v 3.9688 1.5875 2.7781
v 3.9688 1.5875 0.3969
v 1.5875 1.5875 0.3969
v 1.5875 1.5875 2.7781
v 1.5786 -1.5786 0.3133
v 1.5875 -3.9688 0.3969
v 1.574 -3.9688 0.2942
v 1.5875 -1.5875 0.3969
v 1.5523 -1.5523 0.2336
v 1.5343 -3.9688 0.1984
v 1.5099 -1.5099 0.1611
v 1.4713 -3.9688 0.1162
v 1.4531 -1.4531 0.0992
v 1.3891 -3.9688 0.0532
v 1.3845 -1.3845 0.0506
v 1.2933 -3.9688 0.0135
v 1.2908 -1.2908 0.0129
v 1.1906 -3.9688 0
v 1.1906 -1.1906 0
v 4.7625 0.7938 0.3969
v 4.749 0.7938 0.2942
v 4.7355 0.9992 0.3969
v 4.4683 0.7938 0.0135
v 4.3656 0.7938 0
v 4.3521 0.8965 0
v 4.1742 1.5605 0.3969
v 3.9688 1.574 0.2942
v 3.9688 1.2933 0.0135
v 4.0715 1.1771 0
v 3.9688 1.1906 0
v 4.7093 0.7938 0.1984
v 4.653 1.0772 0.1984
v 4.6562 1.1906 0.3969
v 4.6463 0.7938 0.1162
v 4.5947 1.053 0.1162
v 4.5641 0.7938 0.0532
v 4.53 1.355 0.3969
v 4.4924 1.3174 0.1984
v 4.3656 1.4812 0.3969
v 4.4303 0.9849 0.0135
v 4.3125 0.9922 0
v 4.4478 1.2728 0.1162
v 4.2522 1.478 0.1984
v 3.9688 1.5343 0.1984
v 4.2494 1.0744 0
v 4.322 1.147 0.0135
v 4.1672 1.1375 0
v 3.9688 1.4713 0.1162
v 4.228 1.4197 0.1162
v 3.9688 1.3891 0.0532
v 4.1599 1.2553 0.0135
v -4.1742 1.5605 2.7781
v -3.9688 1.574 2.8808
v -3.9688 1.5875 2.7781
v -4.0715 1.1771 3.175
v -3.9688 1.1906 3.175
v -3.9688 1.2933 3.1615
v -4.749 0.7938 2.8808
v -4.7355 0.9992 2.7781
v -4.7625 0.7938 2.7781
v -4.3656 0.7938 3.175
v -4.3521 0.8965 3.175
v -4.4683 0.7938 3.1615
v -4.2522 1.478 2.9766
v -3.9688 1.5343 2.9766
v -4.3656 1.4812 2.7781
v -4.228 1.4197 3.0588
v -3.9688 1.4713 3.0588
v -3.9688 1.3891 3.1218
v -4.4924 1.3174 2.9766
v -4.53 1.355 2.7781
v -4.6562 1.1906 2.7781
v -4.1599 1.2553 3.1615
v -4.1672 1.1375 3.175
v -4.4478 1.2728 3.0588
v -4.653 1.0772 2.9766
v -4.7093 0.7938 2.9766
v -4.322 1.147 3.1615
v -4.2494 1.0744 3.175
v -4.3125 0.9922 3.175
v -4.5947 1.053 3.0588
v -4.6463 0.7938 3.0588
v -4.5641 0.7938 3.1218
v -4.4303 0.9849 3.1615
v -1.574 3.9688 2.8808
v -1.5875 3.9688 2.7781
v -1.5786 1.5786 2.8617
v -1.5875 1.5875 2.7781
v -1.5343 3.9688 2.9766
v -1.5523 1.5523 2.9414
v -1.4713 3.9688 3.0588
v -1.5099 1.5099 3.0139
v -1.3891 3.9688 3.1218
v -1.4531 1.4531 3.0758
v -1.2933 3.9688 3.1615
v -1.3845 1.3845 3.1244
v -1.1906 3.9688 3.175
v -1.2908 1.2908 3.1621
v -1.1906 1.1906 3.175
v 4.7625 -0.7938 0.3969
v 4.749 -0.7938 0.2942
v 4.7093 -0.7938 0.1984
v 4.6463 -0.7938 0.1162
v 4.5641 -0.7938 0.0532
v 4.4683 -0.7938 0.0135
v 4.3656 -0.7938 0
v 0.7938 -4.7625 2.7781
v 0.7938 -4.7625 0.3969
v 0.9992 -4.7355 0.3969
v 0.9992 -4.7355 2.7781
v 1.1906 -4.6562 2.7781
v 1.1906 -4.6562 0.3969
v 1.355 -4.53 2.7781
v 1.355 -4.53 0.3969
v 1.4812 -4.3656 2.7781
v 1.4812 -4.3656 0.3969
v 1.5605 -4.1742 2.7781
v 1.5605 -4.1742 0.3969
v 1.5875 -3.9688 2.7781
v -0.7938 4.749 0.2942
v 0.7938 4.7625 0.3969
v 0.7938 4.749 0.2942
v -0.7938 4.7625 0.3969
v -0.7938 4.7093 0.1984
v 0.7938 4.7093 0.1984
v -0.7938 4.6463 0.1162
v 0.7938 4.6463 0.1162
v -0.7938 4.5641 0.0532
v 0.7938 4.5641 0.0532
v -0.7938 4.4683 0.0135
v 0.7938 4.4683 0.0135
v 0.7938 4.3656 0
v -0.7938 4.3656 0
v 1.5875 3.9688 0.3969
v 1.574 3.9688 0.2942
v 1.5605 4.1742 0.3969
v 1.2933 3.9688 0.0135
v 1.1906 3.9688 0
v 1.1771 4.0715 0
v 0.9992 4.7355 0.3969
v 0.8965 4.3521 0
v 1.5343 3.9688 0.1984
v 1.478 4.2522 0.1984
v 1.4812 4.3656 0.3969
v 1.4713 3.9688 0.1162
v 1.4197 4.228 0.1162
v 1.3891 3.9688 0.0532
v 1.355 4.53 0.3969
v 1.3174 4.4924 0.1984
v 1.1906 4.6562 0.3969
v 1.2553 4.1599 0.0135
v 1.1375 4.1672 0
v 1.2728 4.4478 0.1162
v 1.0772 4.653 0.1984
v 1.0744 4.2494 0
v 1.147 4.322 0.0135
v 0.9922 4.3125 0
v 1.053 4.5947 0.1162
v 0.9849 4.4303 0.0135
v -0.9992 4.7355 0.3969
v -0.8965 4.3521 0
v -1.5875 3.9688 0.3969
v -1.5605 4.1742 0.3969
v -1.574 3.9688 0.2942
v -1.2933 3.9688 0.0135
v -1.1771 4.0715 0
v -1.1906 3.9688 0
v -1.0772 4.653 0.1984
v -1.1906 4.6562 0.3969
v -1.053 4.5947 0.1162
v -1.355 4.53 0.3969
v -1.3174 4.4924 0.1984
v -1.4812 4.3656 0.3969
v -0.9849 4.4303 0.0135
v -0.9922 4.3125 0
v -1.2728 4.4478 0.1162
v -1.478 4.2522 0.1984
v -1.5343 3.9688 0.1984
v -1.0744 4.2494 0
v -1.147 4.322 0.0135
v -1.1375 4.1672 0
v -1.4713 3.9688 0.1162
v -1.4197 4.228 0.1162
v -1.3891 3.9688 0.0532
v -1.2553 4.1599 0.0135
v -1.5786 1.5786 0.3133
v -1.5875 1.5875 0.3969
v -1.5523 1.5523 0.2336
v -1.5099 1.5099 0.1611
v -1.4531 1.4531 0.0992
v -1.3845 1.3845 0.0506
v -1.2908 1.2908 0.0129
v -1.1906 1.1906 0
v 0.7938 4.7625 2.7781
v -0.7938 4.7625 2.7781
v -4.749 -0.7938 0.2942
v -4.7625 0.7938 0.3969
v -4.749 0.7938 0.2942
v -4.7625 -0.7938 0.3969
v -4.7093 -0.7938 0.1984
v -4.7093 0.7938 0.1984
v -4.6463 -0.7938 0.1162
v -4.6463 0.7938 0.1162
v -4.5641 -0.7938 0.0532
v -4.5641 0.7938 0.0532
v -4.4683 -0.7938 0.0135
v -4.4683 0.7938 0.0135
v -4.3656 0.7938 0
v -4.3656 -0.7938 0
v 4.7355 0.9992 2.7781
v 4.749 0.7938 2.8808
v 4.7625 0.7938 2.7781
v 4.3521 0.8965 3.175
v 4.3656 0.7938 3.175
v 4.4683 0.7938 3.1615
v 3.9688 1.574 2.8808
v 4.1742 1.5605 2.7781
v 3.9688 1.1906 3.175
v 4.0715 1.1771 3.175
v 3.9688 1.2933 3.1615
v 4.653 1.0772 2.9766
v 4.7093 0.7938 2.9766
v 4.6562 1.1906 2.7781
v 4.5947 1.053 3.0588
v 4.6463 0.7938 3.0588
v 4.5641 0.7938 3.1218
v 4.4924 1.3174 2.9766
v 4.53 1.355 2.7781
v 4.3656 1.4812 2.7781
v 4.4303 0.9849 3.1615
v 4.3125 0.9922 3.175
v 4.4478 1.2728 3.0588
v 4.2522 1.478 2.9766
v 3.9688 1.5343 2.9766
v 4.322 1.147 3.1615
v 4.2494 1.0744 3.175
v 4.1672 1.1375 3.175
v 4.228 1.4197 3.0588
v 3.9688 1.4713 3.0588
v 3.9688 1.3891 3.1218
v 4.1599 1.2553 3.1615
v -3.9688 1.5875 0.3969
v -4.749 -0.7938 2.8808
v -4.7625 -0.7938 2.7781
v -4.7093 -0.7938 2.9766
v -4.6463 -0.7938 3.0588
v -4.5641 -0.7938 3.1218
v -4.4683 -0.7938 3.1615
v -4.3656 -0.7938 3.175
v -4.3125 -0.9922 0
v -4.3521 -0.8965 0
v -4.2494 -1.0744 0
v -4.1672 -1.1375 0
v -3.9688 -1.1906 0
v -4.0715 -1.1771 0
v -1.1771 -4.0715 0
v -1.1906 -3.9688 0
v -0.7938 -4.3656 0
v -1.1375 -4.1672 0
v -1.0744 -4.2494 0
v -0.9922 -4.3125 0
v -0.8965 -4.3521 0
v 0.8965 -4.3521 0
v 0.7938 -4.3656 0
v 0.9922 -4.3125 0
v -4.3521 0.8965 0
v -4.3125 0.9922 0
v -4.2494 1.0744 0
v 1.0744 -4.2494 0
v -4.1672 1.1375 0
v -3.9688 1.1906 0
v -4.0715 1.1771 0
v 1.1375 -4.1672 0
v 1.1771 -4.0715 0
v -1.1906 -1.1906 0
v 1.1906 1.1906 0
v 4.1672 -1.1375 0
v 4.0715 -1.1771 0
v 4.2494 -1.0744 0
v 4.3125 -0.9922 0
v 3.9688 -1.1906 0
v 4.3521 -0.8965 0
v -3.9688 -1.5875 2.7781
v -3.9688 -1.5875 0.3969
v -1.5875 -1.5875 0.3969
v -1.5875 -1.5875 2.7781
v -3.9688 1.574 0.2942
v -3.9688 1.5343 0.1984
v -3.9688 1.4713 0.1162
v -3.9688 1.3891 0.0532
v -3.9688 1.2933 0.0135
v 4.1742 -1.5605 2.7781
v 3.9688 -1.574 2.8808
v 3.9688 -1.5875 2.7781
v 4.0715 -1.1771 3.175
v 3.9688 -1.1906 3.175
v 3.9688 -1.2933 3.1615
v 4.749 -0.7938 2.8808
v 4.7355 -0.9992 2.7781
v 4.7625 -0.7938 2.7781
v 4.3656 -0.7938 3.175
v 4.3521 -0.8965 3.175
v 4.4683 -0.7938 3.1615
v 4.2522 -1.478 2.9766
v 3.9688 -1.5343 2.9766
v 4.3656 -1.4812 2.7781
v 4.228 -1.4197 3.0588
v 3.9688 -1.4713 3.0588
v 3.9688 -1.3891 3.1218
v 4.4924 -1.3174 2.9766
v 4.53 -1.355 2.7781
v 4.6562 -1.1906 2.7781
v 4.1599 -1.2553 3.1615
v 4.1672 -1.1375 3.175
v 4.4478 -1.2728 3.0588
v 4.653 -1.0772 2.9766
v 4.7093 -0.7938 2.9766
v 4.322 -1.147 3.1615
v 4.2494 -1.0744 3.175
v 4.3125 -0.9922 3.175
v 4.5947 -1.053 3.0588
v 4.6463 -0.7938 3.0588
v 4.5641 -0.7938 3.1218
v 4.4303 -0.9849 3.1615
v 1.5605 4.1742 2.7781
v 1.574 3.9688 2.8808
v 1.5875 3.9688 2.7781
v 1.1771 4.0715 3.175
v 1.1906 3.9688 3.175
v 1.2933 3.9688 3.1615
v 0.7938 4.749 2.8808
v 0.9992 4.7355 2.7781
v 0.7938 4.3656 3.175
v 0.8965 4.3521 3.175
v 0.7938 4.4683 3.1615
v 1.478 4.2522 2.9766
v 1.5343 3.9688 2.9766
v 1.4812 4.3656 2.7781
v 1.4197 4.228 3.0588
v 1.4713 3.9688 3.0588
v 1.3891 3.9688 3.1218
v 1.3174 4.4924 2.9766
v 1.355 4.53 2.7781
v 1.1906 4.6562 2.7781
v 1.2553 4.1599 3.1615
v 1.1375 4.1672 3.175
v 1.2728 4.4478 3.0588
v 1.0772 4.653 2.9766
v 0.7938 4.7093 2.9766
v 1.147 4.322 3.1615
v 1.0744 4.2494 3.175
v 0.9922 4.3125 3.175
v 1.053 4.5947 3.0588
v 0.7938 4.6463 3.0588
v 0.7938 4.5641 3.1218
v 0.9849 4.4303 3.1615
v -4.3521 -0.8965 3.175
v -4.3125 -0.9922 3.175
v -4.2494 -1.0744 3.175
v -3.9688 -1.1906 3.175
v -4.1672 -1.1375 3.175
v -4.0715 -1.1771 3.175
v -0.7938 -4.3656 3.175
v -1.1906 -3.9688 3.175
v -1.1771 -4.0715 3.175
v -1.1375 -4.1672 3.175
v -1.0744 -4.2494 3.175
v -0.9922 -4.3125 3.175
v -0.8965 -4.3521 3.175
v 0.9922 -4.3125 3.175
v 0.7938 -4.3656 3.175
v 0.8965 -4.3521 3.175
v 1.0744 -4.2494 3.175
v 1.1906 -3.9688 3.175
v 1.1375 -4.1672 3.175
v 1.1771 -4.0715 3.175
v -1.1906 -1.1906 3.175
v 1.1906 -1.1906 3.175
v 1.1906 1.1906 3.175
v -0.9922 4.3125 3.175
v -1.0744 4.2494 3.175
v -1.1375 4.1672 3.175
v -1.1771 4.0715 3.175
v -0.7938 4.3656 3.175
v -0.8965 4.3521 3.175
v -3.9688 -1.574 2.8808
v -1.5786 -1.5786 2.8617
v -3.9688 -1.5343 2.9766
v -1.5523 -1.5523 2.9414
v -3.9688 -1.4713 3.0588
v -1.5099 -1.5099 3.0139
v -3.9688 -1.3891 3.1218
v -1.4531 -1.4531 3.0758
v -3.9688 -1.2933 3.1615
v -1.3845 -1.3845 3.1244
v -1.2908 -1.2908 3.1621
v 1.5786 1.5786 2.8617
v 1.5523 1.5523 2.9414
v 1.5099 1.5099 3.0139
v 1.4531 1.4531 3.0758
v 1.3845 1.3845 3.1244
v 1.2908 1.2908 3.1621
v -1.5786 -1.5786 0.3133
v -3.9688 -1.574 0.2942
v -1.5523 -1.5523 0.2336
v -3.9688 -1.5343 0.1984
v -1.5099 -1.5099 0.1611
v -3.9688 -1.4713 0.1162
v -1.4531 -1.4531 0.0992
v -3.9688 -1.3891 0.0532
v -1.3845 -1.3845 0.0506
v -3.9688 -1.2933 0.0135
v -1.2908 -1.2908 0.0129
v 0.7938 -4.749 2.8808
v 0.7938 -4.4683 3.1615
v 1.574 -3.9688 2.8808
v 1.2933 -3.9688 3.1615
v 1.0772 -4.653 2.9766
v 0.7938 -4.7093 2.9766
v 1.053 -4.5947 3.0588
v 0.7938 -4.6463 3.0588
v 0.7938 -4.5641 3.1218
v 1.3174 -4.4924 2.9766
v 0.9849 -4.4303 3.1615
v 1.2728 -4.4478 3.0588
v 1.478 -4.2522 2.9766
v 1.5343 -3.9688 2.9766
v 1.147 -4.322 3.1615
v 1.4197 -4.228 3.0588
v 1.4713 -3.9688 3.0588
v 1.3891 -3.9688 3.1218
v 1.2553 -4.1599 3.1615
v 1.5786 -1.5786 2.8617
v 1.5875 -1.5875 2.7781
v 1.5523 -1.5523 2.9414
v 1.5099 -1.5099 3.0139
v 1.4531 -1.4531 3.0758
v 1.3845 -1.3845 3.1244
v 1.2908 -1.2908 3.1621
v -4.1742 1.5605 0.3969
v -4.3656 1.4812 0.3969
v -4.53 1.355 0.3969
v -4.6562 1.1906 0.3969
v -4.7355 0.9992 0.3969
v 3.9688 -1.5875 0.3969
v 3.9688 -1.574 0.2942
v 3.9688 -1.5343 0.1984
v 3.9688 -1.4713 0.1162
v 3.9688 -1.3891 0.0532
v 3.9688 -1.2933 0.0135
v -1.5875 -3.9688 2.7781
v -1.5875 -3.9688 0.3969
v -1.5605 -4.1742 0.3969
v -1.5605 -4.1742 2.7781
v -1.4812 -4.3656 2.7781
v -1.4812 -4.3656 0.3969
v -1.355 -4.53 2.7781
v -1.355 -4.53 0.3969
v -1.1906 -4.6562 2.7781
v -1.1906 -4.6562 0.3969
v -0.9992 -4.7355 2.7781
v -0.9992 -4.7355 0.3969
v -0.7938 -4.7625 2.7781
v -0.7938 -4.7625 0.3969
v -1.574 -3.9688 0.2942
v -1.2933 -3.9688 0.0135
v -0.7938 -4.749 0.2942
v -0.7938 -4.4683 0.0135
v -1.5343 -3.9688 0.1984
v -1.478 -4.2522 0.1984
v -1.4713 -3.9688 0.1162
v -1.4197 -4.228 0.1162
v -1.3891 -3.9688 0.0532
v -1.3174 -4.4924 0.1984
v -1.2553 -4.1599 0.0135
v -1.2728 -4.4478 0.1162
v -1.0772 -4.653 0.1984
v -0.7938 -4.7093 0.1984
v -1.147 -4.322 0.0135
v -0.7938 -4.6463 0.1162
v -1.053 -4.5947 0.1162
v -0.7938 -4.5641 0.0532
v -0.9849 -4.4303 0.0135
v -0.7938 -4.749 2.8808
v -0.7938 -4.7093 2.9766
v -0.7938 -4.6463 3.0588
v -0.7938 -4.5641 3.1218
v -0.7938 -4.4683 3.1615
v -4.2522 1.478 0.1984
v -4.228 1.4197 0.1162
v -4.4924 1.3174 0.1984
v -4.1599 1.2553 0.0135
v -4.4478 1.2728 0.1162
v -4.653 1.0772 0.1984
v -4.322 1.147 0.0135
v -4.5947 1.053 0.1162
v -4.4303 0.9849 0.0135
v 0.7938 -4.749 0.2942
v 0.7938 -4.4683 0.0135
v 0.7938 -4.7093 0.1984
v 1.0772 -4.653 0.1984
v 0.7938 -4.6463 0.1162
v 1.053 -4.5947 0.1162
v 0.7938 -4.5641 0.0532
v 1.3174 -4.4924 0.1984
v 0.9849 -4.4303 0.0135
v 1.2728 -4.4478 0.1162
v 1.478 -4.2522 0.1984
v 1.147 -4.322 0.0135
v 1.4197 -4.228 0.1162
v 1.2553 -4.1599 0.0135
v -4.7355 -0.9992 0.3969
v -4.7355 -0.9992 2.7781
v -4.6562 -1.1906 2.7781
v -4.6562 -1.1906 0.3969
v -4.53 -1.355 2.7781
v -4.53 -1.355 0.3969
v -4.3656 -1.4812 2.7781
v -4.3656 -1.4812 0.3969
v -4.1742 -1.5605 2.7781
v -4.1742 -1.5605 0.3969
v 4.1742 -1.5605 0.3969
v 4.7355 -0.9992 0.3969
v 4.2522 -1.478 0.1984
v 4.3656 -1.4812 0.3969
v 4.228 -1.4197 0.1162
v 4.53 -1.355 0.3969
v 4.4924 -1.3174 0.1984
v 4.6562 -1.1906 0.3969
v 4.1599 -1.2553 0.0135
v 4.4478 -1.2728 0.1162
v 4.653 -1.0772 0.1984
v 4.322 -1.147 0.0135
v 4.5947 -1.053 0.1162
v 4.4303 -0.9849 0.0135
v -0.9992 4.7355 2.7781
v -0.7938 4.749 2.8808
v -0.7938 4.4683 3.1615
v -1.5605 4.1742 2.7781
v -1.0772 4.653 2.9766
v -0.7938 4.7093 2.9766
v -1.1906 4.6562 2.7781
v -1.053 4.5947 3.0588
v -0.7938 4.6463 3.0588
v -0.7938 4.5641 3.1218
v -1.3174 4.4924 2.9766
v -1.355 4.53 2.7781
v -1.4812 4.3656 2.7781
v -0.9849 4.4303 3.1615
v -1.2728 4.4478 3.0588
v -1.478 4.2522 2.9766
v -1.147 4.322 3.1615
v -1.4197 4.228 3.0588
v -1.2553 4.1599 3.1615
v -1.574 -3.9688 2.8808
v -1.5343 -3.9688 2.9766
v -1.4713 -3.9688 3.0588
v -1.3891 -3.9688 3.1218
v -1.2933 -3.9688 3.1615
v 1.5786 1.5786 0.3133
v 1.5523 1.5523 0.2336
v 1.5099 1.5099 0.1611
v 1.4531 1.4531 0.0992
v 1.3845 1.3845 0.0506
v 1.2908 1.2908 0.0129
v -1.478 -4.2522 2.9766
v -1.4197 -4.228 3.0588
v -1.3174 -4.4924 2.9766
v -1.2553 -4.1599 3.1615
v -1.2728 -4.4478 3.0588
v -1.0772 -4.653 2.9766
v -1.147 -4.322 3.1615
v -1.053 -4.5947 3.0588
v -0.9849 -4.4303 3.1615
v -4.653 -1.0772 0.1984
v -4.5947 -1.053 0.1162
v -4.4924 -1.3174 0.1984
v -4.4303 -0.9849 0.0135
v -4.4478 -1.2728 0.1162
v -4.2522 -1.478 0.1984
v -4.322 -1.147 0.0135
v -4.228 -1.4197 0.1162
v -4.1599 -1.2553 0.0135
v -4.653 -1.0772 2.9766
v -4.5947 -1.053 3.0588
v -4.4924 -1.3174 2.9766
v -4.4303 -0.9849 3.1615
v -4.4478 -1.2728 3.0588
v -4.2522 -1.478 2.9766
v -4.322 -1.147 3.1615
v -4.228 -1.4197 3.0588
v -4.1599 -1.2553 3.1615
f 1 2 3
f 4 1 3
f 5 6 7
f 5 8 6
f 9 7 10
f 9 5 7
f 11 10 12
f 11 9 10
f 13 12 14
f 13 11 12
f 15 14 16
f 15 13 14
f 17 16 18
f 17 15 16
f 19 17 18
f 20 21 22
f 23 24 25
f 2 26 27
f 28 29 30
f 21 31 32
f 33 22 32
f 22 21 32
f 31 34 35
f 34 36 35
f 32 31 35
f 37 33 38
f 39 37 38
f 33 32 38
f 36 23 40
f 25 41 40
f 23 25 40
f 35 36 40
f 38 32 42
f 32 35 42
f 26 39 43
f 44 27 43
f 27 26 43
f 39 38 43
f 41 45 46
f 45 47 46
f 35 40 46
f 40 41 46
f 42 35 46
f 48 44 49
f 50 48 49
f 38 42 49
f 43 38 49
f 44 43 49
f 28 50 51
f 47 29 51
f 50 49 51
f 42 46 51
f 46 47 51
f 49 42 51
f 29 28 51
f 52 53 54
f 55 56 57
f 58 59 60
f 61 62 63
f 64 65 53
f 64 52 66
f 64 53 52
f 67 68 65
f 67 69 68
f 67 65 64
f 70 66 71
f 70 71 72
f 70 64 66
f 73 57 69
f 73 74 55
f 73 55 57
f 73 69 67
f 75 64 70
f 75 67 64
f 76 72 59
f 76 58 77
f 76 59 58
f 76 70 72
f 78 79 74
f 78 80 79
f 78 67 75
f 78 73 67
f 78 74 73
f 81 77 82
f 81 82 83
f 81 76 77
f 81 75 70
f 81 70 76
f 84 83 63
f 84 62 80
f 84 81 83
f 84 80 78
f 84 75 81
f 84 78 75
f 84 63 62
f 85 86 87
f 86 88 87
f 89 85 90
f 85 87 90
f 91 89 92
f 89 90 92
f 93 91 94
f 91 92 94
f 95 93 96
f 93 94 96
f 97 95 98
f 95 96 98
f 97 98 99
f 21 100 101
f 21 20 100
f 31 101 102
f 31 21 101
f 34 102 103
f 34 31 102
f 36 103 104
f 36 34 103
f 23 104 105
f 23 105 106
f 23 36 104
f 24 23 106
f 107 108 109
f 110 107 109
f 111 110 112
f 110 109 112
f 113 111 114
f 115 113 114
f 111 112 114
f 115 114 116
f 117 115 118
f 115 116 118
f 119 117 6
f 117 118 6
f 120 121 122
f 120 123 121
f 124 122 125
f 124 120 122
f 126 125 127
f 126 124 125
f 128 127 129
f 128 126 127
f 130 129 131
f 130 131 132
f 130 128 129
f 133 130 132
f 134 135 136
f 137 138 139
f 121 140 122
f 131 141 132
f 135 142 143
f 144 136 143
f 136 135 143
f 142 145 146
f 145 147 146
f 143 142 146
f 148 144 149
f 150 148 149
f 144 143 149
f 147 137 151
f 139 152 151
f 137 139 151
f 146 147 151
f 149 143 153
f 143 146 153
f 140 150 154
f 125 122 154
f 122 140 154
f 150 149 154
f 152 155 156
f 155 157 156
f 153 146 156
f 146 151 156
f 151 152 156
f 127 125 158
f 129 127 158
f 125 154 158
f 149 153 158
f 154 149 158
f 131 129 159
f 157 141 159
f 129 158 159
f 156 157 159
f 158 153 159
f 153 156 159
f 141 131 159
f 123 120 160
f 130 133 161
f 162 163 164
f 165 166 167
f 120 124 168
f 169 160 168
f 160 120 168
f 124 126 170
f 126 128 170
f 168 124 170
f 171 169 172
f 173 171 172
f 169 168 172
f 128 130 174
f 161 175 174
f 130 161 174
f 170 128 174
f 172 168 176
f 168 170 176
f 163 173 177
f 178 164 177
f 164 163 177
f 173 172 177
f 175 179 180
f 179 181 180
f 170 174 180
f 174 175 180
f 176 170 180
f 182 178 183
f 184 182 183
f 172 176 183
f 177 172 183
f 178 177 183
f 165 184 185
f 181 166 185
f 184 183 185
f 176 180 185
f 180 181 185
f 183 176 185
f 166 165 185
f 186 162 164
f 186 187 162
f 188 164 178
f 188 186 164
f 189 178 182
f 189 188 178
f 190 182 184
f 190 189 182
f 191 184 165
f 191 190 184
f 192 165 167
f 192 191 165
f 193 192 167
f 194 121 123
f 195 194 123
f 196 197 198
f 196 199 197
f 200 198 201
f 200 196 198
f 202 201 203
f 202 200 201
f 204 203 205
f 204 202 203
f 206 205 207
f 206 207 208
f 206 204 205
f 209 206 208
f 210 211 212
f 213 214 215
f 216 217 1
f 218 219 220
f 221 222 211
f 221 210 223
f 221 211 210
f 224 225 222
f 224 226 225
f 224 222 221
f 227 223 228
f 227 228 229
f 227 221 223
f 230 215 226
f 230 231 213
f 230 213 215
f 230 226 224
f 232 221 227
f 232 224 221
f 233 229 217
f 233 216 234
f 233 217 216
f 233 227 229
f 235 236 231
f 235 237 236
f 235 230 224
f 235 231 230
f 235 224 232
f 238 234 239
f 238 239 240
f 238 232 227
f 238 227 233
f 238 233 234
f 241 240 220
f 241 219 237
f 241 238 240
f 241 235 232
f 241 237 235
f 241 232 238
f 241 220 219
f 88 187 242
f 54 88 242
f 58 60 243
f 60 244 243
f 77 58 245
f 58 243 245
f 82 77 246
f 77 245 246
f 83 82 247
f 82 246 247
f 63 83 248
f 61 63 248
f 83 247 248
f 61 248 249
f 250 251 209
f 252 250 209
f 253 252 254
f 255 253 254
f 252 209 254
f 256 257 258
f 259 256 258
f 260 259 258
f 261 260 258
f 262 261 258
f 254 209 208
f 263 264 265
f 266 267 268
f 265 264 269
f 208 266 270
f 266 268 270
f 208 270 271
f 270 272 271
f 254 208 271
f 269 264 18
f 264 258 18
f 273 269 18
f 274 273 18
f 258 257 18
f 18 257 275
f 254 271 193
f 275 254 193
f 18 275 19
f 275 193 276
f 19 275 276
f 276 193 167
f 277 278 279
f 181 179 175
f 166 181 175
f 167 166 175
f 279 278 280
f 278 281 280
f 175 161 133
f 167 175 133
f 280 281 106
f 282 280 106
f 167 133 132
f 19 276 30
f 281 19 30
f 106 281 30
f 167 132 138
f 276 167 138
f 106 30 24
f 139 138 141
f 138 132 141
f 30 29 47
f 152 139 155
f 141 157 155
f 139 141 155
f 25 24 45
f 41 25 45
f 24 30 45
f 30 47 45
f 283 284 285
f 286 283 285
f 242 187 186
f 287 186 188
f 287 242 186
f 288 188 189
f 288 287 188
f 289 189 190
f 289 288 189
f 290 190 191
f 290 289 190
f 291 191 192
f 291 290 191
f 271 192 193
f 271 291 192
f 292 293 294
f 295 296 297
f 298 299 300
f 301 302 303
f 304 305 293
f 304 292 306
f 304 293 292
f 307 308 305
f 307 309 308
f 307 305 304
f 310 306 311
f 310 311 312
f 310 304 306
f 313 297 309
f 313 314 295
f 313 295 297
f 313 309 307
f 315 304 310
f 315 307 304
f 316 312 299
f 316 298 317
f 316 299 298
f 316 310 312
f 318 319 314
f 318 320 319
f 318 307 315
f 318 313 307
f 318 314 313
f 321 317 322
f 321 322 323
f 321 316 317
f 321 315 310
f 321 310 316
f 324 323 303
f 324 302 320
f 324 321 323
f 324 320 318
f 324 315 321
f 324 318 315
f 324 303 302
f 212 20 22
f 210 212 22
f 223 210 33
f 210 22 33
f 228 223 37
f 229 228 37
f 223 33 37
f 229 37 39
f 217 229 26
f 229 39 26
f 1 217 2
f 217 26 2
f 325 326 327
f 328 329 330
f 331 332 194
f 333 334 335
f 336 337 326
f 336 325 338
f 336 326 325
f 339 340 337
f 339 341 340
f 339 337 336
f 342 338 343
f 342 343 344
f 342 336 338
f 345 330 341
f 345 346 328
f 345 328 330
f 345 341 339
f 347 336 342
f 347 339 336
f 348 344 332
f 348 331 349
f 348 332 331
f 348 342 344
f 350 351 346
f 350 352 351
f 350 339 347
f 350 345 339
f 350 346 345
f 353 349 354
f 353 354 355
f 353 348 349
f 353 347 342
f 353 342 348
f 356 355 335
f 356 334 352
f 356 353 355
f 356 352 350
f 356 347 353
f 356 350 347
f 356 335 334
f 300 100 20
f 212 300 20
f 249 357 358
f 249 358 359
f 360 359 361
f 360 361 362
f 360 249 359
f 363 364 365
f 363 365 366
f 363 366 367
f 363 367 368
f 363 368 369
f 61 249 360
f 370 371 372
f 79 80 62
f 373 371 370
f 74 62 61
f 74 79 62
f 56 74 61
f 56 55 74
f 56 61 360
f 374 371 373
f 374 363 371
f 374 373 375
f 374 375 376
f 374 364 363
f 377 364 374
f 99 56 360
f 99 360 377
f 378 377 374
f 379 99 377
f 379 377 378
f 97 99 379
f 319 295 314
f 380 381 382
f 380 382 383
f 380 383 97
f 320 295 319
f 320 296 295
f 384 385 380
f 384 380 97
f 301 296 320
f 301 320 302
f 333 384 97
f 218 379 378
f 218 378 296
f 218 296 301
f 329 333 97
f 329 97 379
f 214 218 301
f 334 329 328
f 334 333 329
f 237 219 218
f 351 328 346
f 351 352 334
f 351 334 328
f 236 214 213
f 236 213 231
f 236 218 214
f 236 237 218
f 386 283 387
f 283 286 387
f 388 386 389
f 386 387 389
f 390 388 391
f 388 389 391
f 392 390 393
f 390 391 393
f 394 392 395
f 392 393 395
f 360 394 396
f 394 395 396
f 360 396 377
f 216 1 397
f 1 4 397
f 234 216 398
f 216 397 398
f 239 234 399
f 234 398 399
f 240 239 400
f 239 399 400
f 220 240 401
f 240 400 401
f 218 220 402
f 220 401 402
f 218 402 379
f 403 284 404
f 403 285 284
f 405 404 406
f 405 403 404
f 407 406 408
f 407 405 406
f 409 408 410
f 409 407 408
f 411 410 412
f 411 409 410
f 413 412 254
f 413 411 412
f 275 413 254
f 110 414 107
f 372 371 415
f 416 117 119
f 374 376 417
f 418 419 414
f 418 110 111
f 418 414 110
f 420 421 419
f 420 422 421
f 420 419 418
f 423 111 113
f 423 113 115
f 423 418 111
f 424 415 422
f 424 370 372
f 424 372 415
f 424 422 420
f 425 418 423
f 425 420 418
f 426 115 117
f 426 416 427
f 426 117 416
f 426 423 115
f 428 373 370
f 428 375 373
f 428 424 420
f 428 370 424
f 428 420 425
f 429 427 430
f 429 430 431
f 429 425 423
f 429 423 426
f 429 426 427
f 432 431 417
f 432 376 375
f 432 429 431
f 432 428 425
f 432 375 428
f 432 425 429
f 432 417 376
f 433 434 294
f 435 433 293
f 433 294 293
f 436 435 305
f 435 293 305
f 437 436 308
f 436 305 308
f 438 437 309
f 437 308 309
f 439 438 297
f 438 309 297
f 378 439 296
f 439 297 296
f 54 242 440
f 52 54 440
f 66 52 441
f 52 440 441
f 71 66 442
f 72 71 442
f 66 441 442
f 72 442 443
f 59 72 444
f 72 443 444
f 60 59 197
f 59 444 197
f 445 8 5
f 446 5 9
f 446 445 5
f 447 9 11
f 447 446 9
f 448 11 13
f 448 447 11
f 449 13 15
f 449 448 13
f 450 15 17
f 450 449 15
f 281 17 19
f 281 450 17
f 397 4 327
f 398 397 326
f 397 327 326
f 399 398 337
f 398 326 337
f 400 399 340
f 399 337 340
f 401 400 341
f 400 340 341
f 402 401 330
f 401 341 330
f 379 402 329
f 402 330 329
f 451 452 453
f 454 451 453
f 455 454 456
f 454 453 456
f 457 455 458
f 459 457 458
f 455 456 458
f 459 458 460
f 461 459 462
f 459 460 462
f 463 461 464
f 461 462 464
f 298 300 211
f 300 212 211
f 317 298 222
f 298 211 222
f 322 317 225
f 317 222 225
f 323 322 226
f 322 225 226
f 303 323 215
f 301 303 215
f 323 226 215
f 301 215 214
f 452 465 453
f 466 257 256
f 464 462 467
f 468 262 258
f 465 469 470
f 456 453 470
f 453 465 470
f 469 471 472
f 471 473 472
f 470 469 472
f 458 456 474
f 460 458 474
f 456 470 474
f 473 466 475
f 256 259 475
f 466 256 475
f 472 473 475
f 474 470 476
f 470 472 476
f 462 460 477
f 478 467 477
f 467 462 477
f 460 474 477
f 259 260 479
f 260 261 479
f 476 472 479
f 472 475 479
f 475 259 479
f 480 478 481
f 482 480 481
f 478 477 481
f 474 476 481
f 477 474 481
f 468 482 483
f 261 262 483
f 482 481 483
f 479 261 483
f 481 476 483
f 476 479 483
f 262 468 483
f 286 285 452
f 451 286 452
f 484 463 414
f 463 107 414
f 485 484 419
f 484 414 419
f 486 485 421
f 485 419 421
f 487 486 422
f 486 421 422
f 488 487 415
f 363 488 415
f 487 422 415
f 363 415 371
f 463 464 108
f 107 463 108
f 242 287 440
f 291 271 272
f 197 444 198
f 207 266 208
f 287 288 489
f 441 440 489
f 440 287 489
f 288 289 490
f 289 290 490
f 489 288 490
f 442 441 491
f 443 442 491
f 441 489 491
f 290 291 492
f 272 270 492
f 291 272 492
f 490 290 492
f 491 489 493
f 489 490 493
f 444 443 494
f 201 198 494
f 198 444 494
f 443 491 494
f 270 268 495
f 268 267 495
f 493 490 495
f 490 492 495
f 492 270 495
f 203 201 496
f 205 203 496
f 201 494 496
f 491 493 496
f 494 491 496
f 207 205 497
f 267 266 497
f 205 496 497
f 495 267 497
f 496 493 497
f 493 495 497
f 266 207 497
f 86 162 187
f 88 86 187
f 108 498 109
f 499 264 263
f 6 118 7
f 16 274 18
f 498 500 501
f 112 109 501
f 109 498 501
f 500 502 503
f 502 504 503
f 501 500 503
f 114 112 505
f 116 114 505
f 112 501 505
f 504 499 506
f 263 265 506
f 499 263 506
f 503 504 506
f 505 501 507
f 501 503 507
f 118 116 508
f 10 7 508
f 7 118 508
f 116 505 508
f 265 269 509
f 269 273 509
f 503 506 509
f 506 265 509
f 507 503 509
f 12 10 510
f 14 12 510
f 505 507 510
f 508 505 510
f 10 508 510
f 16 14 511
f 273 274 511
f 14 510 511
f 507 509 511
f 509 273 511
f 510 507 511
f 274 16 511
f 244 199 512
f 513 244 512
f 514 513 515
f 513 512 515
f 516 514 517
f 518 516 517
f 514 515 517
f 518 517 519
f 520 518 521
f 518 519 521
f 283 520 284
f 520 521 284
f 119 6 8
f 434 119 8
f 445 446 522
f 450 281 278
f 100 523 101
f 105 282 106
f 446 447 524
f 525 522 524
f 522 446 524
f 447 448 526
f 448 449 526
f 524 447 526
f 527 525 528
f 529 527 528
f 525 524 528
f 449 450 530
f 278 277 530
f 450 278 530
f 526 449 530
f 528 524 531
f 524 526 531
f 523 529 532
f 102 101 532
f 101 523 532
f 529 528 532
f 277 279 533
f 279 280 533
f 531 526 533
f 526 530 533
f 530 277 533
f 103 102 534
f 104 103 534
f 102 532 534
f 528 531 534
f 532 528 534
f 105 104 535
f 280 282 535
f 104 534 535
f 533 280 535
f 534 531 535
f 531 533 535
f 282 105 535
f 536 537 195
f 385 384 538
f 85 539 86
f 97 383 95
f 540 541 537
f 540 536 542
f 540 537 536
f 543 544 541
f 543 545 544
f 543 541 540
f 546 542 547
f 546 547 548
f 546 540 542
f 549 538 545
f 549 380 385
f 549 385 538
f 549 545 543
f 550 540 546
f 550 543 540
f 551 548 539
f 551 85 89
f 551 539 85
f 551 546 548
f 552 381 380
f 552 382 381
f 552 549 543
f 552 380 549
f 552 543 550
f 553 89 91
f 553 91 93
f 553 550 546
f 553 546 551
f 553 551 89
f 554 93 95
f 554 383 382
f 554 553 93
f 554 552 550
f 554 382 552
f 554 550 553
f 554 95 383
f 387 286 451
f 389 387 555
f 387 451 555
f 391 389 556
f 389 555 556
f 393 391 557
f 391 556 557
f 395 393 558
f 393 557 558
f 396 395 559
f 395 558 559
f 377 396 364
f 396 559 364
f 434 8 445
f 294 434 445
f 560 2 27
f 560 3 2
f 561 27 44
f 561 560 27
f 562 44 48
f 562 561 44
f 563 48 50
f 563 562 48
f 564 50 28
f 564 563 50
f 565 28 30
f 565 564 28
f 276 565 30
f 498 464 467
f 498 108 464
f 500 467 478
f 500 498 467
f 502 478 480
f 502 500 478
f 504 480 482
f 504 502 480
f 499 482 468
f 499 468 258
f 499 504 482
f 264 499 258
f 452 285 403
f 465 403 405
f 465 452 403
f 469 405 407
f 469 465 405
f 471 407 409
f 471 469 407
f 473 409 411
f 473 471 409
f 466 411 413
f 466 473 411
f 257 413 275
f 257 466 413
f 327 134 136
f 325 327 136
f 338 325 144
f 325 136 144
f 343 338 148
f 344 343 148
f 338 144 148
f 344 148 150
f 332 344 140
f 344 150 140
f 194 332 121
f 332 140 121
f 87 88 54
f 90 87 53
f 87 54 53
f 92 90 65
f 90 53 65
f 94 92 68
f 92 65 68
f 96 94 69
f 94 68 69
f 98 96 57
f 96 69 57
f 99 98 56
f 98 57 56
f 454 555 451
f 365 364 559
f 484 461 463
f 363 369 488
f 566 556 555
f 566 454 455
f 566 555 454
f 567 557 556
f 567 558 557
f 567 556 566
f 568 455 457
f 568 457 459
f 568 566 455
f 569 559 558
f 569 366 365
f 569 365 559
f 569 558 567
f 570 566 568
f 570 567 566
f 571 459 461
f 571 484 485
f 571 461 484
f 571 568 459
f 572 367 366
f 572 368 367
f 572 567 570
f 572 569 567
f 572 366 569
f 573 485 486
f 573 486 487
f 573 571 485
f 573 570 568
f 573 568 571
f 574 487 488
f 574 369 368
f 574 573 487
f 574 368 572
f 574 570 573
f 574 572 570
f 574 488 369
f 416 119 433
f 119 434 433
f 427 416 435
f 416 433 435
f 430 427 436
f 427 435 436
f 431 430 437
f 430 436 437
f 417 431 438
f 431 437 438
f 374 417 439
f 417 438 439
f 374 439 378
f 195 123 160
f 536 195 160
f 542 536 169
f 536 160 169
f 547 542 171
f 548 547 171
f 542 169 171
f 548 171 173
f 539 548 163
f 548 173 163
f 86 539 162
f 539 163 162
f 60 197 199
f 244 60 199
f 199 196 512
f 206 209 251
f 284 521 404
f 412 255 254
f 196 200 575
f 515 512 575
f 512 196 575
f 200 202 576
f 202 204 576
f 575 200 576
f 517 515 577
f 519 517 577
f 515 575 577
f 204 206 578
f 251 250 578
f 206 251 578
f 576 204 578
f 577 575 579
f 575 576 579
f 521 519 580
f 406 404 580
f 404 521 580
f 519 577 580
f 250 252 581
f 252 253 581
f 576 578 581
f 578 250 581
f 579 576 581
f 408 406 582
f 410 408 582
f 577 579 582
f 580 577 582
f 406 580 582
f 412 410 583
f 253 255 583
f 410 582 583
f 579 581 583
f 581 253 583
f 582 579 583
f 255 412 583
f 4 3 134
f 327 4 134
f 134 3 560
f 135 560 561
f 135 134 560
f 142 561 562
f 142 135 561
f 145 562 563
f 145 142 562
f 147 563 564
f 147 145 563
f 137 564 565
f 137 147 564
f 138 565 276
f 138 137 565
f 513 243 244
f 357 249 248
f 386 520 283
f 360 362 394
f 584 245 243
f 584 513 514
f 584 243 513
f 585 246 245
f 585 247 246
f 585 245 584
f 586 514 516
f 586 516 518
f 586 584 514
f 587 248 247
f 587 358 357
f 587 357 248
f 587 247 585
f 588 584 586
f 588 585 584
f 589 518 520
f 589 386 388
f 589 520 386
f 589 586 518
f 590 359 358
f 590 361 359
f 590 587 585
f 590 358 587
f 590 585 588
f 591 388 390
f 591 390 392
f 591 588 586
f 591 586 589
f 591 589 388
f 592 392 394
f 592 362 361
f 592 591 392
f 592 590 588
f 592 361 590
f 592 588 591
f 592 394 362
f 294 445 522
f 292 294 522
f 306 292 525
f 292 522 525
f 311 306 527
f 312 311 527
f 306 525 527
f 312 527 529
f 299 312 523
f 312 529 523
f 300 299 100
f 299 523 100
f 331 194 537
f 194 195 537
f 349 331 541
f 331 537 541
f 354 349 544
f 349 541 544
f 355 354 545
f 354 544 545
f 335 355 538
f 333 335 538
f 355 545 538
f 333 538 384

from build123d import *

# Parameters (mm, degrees)
F0_W     = 3.175
F0_H     = 3.175
F1_DEPTH = 3.175
F2_R     = 0.396875


with BuildPart() as f1:
    # F0 (on Top) → F1 (new body)
    with BuildSketch(Plane.XY):
        with BuildLine():
            ThreePointArc((1.5875, 3.96875), (1.3550160076, 4.5300160076), (0.79375, 4.7625))
            Line((0.79375, 4.7625), (-0.79375, 4.7625))
            ThreePointArc((-0.79375, 4.7625), (-1.3550160076, 4.5300160076), (-1.5875, 3.96875))
            Line((-1.5875, 3.96875), (-1.5875, 1.5875))
            Line((-1.5875, 1.5875), (1.5875, 1.5875))
            Line((1.5875, 1.5875), (1.5875, 3.96875))
        make_face()
        with BuildLine():
            Line((3.96875, 1.5875), (1.5875, 1.5875))
            Line((1.5875, 1.5875), (1.5875, -1.5875))
            Line((1.5875, -1.5875), (3.96875, -1.5875))
            ThreePointArc((3.96875, -1.5875), (4.5300160076, -1.3550160076), (4.7625, -0.79375))
            Line((4.7625, -0.79375), (4.7625, 0.79375))
            ThreePointArc((4.7625, 0.79375), (4.5300160076, 1.3550160076), (3.96875, 1.5875))
        make_face()
        Rectangle(F0_W, F0_H)
        with BuildLine():
            Line((-1.5875, -1.5875), (-1.5875, 1.5875))
            Line((-1.5875, 1.5875), (-3.96875, 1.5875))
            ThreePointArc((-3.96875, 1.5875), (-4.5300160076, 1.3550160076), (-4.7625, 0.79375))
            Line((-4.7625, 0.79375), (-4.7625, -0.79375))
            ThreePointArc((-4.7625, -0.79375), (-4.5300160076, -1.3550160076), (-3.96875, -1.5875))
            Line((-3.96875, -1.5875), (-1.5875, -1.5875))
        make_face()
        with BuildLine():
            Line((1.5875, -3.96875), (1.5875, -1.5875))
            Line((1.5875, -1.5875), (-1.5875, -1.5875))
            Line((-1.5875, -1.5875), (-1.5875, -3.96875))
            ThreePointArc((-1.5875, -3.96875), (-1.3550160076, -4.5300160076), (-0.79375, -4.7625))
            Line((-0.79375, -4.7625), (0.79375, -4.7625))
            ThreePointArc((0.79375, -4.7625), (1.3550160076, -4.5300160076), (1.5875, -3.96875))
        make_face()
    extrude(amount=F1_DEPTH)

    # F2
    f2_edges = [f1.edges().sort_by_distance(p)[0] for p in [
        (1.355016, 4.530016, 3.175),
        (0, 4.7625, 3.175),
        (-1.355016, 4.530016, 3.175),
        (-1.5875, 2.778125, 3.175),
        (-2.778125, 1.5875, 3.175),
        (-4.530016, 1.355016, 3.175),
        (-4.7625, 0, 3.175),
        (-4.530016, -1.355016, 3.175),
        (-2.778125, -1.5875, 3.175),
        (-1.5875, -2.778125, 3.175),
        (-1.355016, -4.530016, 3.175),
        (0, -4.7625, 3.175),
        (1.355016, -4.530016, 3.175),
        (1.5875, -2.778125, 3.175),
        (2.778125, -1.5875, 3.175),
        (4.530016, -1.355016, 3.175),
        (4.7625, 0, 3.175),
        (4.530016, 1.355016, 3.175),
        (2.778125, 1.5875, 3.175),
        (1.5875, 2.778125, 3.175),
        (1.355016, 4.530016, 0),
        (0, 4.7625, 0),
        (-1.355016, 4.530016, 0),
        (-1.5875, 2.778125, 0),
        (-2.778125, 1.5875, 0),
        (-4.530016, 1.355016, 0),
        (-4.7625, 0, 0),
        (-4.530016, -1.355016, 0),
        (-2.778125, -1.5875, 0),
        (-1.5875, -2.778125, 0),
        (-1.355016, -4.530016, 0),
        (0, -4.7625, 0),
        (1.355016, -4.530016, 0),
        (1.5875, -2.778125, 0),
        (2.778125, -1.5875, 0),
        (4.530016, -1.355016, 0),
        (4.7625, 0, 0),
        (4.530016, 1.355016, 0),
        (2.778125, 1.5875, 0),
        (1.5875, 2.778125, 0),
    ]]
    fillet(f2_edges, radius=F2_R)


solid = f1.part
